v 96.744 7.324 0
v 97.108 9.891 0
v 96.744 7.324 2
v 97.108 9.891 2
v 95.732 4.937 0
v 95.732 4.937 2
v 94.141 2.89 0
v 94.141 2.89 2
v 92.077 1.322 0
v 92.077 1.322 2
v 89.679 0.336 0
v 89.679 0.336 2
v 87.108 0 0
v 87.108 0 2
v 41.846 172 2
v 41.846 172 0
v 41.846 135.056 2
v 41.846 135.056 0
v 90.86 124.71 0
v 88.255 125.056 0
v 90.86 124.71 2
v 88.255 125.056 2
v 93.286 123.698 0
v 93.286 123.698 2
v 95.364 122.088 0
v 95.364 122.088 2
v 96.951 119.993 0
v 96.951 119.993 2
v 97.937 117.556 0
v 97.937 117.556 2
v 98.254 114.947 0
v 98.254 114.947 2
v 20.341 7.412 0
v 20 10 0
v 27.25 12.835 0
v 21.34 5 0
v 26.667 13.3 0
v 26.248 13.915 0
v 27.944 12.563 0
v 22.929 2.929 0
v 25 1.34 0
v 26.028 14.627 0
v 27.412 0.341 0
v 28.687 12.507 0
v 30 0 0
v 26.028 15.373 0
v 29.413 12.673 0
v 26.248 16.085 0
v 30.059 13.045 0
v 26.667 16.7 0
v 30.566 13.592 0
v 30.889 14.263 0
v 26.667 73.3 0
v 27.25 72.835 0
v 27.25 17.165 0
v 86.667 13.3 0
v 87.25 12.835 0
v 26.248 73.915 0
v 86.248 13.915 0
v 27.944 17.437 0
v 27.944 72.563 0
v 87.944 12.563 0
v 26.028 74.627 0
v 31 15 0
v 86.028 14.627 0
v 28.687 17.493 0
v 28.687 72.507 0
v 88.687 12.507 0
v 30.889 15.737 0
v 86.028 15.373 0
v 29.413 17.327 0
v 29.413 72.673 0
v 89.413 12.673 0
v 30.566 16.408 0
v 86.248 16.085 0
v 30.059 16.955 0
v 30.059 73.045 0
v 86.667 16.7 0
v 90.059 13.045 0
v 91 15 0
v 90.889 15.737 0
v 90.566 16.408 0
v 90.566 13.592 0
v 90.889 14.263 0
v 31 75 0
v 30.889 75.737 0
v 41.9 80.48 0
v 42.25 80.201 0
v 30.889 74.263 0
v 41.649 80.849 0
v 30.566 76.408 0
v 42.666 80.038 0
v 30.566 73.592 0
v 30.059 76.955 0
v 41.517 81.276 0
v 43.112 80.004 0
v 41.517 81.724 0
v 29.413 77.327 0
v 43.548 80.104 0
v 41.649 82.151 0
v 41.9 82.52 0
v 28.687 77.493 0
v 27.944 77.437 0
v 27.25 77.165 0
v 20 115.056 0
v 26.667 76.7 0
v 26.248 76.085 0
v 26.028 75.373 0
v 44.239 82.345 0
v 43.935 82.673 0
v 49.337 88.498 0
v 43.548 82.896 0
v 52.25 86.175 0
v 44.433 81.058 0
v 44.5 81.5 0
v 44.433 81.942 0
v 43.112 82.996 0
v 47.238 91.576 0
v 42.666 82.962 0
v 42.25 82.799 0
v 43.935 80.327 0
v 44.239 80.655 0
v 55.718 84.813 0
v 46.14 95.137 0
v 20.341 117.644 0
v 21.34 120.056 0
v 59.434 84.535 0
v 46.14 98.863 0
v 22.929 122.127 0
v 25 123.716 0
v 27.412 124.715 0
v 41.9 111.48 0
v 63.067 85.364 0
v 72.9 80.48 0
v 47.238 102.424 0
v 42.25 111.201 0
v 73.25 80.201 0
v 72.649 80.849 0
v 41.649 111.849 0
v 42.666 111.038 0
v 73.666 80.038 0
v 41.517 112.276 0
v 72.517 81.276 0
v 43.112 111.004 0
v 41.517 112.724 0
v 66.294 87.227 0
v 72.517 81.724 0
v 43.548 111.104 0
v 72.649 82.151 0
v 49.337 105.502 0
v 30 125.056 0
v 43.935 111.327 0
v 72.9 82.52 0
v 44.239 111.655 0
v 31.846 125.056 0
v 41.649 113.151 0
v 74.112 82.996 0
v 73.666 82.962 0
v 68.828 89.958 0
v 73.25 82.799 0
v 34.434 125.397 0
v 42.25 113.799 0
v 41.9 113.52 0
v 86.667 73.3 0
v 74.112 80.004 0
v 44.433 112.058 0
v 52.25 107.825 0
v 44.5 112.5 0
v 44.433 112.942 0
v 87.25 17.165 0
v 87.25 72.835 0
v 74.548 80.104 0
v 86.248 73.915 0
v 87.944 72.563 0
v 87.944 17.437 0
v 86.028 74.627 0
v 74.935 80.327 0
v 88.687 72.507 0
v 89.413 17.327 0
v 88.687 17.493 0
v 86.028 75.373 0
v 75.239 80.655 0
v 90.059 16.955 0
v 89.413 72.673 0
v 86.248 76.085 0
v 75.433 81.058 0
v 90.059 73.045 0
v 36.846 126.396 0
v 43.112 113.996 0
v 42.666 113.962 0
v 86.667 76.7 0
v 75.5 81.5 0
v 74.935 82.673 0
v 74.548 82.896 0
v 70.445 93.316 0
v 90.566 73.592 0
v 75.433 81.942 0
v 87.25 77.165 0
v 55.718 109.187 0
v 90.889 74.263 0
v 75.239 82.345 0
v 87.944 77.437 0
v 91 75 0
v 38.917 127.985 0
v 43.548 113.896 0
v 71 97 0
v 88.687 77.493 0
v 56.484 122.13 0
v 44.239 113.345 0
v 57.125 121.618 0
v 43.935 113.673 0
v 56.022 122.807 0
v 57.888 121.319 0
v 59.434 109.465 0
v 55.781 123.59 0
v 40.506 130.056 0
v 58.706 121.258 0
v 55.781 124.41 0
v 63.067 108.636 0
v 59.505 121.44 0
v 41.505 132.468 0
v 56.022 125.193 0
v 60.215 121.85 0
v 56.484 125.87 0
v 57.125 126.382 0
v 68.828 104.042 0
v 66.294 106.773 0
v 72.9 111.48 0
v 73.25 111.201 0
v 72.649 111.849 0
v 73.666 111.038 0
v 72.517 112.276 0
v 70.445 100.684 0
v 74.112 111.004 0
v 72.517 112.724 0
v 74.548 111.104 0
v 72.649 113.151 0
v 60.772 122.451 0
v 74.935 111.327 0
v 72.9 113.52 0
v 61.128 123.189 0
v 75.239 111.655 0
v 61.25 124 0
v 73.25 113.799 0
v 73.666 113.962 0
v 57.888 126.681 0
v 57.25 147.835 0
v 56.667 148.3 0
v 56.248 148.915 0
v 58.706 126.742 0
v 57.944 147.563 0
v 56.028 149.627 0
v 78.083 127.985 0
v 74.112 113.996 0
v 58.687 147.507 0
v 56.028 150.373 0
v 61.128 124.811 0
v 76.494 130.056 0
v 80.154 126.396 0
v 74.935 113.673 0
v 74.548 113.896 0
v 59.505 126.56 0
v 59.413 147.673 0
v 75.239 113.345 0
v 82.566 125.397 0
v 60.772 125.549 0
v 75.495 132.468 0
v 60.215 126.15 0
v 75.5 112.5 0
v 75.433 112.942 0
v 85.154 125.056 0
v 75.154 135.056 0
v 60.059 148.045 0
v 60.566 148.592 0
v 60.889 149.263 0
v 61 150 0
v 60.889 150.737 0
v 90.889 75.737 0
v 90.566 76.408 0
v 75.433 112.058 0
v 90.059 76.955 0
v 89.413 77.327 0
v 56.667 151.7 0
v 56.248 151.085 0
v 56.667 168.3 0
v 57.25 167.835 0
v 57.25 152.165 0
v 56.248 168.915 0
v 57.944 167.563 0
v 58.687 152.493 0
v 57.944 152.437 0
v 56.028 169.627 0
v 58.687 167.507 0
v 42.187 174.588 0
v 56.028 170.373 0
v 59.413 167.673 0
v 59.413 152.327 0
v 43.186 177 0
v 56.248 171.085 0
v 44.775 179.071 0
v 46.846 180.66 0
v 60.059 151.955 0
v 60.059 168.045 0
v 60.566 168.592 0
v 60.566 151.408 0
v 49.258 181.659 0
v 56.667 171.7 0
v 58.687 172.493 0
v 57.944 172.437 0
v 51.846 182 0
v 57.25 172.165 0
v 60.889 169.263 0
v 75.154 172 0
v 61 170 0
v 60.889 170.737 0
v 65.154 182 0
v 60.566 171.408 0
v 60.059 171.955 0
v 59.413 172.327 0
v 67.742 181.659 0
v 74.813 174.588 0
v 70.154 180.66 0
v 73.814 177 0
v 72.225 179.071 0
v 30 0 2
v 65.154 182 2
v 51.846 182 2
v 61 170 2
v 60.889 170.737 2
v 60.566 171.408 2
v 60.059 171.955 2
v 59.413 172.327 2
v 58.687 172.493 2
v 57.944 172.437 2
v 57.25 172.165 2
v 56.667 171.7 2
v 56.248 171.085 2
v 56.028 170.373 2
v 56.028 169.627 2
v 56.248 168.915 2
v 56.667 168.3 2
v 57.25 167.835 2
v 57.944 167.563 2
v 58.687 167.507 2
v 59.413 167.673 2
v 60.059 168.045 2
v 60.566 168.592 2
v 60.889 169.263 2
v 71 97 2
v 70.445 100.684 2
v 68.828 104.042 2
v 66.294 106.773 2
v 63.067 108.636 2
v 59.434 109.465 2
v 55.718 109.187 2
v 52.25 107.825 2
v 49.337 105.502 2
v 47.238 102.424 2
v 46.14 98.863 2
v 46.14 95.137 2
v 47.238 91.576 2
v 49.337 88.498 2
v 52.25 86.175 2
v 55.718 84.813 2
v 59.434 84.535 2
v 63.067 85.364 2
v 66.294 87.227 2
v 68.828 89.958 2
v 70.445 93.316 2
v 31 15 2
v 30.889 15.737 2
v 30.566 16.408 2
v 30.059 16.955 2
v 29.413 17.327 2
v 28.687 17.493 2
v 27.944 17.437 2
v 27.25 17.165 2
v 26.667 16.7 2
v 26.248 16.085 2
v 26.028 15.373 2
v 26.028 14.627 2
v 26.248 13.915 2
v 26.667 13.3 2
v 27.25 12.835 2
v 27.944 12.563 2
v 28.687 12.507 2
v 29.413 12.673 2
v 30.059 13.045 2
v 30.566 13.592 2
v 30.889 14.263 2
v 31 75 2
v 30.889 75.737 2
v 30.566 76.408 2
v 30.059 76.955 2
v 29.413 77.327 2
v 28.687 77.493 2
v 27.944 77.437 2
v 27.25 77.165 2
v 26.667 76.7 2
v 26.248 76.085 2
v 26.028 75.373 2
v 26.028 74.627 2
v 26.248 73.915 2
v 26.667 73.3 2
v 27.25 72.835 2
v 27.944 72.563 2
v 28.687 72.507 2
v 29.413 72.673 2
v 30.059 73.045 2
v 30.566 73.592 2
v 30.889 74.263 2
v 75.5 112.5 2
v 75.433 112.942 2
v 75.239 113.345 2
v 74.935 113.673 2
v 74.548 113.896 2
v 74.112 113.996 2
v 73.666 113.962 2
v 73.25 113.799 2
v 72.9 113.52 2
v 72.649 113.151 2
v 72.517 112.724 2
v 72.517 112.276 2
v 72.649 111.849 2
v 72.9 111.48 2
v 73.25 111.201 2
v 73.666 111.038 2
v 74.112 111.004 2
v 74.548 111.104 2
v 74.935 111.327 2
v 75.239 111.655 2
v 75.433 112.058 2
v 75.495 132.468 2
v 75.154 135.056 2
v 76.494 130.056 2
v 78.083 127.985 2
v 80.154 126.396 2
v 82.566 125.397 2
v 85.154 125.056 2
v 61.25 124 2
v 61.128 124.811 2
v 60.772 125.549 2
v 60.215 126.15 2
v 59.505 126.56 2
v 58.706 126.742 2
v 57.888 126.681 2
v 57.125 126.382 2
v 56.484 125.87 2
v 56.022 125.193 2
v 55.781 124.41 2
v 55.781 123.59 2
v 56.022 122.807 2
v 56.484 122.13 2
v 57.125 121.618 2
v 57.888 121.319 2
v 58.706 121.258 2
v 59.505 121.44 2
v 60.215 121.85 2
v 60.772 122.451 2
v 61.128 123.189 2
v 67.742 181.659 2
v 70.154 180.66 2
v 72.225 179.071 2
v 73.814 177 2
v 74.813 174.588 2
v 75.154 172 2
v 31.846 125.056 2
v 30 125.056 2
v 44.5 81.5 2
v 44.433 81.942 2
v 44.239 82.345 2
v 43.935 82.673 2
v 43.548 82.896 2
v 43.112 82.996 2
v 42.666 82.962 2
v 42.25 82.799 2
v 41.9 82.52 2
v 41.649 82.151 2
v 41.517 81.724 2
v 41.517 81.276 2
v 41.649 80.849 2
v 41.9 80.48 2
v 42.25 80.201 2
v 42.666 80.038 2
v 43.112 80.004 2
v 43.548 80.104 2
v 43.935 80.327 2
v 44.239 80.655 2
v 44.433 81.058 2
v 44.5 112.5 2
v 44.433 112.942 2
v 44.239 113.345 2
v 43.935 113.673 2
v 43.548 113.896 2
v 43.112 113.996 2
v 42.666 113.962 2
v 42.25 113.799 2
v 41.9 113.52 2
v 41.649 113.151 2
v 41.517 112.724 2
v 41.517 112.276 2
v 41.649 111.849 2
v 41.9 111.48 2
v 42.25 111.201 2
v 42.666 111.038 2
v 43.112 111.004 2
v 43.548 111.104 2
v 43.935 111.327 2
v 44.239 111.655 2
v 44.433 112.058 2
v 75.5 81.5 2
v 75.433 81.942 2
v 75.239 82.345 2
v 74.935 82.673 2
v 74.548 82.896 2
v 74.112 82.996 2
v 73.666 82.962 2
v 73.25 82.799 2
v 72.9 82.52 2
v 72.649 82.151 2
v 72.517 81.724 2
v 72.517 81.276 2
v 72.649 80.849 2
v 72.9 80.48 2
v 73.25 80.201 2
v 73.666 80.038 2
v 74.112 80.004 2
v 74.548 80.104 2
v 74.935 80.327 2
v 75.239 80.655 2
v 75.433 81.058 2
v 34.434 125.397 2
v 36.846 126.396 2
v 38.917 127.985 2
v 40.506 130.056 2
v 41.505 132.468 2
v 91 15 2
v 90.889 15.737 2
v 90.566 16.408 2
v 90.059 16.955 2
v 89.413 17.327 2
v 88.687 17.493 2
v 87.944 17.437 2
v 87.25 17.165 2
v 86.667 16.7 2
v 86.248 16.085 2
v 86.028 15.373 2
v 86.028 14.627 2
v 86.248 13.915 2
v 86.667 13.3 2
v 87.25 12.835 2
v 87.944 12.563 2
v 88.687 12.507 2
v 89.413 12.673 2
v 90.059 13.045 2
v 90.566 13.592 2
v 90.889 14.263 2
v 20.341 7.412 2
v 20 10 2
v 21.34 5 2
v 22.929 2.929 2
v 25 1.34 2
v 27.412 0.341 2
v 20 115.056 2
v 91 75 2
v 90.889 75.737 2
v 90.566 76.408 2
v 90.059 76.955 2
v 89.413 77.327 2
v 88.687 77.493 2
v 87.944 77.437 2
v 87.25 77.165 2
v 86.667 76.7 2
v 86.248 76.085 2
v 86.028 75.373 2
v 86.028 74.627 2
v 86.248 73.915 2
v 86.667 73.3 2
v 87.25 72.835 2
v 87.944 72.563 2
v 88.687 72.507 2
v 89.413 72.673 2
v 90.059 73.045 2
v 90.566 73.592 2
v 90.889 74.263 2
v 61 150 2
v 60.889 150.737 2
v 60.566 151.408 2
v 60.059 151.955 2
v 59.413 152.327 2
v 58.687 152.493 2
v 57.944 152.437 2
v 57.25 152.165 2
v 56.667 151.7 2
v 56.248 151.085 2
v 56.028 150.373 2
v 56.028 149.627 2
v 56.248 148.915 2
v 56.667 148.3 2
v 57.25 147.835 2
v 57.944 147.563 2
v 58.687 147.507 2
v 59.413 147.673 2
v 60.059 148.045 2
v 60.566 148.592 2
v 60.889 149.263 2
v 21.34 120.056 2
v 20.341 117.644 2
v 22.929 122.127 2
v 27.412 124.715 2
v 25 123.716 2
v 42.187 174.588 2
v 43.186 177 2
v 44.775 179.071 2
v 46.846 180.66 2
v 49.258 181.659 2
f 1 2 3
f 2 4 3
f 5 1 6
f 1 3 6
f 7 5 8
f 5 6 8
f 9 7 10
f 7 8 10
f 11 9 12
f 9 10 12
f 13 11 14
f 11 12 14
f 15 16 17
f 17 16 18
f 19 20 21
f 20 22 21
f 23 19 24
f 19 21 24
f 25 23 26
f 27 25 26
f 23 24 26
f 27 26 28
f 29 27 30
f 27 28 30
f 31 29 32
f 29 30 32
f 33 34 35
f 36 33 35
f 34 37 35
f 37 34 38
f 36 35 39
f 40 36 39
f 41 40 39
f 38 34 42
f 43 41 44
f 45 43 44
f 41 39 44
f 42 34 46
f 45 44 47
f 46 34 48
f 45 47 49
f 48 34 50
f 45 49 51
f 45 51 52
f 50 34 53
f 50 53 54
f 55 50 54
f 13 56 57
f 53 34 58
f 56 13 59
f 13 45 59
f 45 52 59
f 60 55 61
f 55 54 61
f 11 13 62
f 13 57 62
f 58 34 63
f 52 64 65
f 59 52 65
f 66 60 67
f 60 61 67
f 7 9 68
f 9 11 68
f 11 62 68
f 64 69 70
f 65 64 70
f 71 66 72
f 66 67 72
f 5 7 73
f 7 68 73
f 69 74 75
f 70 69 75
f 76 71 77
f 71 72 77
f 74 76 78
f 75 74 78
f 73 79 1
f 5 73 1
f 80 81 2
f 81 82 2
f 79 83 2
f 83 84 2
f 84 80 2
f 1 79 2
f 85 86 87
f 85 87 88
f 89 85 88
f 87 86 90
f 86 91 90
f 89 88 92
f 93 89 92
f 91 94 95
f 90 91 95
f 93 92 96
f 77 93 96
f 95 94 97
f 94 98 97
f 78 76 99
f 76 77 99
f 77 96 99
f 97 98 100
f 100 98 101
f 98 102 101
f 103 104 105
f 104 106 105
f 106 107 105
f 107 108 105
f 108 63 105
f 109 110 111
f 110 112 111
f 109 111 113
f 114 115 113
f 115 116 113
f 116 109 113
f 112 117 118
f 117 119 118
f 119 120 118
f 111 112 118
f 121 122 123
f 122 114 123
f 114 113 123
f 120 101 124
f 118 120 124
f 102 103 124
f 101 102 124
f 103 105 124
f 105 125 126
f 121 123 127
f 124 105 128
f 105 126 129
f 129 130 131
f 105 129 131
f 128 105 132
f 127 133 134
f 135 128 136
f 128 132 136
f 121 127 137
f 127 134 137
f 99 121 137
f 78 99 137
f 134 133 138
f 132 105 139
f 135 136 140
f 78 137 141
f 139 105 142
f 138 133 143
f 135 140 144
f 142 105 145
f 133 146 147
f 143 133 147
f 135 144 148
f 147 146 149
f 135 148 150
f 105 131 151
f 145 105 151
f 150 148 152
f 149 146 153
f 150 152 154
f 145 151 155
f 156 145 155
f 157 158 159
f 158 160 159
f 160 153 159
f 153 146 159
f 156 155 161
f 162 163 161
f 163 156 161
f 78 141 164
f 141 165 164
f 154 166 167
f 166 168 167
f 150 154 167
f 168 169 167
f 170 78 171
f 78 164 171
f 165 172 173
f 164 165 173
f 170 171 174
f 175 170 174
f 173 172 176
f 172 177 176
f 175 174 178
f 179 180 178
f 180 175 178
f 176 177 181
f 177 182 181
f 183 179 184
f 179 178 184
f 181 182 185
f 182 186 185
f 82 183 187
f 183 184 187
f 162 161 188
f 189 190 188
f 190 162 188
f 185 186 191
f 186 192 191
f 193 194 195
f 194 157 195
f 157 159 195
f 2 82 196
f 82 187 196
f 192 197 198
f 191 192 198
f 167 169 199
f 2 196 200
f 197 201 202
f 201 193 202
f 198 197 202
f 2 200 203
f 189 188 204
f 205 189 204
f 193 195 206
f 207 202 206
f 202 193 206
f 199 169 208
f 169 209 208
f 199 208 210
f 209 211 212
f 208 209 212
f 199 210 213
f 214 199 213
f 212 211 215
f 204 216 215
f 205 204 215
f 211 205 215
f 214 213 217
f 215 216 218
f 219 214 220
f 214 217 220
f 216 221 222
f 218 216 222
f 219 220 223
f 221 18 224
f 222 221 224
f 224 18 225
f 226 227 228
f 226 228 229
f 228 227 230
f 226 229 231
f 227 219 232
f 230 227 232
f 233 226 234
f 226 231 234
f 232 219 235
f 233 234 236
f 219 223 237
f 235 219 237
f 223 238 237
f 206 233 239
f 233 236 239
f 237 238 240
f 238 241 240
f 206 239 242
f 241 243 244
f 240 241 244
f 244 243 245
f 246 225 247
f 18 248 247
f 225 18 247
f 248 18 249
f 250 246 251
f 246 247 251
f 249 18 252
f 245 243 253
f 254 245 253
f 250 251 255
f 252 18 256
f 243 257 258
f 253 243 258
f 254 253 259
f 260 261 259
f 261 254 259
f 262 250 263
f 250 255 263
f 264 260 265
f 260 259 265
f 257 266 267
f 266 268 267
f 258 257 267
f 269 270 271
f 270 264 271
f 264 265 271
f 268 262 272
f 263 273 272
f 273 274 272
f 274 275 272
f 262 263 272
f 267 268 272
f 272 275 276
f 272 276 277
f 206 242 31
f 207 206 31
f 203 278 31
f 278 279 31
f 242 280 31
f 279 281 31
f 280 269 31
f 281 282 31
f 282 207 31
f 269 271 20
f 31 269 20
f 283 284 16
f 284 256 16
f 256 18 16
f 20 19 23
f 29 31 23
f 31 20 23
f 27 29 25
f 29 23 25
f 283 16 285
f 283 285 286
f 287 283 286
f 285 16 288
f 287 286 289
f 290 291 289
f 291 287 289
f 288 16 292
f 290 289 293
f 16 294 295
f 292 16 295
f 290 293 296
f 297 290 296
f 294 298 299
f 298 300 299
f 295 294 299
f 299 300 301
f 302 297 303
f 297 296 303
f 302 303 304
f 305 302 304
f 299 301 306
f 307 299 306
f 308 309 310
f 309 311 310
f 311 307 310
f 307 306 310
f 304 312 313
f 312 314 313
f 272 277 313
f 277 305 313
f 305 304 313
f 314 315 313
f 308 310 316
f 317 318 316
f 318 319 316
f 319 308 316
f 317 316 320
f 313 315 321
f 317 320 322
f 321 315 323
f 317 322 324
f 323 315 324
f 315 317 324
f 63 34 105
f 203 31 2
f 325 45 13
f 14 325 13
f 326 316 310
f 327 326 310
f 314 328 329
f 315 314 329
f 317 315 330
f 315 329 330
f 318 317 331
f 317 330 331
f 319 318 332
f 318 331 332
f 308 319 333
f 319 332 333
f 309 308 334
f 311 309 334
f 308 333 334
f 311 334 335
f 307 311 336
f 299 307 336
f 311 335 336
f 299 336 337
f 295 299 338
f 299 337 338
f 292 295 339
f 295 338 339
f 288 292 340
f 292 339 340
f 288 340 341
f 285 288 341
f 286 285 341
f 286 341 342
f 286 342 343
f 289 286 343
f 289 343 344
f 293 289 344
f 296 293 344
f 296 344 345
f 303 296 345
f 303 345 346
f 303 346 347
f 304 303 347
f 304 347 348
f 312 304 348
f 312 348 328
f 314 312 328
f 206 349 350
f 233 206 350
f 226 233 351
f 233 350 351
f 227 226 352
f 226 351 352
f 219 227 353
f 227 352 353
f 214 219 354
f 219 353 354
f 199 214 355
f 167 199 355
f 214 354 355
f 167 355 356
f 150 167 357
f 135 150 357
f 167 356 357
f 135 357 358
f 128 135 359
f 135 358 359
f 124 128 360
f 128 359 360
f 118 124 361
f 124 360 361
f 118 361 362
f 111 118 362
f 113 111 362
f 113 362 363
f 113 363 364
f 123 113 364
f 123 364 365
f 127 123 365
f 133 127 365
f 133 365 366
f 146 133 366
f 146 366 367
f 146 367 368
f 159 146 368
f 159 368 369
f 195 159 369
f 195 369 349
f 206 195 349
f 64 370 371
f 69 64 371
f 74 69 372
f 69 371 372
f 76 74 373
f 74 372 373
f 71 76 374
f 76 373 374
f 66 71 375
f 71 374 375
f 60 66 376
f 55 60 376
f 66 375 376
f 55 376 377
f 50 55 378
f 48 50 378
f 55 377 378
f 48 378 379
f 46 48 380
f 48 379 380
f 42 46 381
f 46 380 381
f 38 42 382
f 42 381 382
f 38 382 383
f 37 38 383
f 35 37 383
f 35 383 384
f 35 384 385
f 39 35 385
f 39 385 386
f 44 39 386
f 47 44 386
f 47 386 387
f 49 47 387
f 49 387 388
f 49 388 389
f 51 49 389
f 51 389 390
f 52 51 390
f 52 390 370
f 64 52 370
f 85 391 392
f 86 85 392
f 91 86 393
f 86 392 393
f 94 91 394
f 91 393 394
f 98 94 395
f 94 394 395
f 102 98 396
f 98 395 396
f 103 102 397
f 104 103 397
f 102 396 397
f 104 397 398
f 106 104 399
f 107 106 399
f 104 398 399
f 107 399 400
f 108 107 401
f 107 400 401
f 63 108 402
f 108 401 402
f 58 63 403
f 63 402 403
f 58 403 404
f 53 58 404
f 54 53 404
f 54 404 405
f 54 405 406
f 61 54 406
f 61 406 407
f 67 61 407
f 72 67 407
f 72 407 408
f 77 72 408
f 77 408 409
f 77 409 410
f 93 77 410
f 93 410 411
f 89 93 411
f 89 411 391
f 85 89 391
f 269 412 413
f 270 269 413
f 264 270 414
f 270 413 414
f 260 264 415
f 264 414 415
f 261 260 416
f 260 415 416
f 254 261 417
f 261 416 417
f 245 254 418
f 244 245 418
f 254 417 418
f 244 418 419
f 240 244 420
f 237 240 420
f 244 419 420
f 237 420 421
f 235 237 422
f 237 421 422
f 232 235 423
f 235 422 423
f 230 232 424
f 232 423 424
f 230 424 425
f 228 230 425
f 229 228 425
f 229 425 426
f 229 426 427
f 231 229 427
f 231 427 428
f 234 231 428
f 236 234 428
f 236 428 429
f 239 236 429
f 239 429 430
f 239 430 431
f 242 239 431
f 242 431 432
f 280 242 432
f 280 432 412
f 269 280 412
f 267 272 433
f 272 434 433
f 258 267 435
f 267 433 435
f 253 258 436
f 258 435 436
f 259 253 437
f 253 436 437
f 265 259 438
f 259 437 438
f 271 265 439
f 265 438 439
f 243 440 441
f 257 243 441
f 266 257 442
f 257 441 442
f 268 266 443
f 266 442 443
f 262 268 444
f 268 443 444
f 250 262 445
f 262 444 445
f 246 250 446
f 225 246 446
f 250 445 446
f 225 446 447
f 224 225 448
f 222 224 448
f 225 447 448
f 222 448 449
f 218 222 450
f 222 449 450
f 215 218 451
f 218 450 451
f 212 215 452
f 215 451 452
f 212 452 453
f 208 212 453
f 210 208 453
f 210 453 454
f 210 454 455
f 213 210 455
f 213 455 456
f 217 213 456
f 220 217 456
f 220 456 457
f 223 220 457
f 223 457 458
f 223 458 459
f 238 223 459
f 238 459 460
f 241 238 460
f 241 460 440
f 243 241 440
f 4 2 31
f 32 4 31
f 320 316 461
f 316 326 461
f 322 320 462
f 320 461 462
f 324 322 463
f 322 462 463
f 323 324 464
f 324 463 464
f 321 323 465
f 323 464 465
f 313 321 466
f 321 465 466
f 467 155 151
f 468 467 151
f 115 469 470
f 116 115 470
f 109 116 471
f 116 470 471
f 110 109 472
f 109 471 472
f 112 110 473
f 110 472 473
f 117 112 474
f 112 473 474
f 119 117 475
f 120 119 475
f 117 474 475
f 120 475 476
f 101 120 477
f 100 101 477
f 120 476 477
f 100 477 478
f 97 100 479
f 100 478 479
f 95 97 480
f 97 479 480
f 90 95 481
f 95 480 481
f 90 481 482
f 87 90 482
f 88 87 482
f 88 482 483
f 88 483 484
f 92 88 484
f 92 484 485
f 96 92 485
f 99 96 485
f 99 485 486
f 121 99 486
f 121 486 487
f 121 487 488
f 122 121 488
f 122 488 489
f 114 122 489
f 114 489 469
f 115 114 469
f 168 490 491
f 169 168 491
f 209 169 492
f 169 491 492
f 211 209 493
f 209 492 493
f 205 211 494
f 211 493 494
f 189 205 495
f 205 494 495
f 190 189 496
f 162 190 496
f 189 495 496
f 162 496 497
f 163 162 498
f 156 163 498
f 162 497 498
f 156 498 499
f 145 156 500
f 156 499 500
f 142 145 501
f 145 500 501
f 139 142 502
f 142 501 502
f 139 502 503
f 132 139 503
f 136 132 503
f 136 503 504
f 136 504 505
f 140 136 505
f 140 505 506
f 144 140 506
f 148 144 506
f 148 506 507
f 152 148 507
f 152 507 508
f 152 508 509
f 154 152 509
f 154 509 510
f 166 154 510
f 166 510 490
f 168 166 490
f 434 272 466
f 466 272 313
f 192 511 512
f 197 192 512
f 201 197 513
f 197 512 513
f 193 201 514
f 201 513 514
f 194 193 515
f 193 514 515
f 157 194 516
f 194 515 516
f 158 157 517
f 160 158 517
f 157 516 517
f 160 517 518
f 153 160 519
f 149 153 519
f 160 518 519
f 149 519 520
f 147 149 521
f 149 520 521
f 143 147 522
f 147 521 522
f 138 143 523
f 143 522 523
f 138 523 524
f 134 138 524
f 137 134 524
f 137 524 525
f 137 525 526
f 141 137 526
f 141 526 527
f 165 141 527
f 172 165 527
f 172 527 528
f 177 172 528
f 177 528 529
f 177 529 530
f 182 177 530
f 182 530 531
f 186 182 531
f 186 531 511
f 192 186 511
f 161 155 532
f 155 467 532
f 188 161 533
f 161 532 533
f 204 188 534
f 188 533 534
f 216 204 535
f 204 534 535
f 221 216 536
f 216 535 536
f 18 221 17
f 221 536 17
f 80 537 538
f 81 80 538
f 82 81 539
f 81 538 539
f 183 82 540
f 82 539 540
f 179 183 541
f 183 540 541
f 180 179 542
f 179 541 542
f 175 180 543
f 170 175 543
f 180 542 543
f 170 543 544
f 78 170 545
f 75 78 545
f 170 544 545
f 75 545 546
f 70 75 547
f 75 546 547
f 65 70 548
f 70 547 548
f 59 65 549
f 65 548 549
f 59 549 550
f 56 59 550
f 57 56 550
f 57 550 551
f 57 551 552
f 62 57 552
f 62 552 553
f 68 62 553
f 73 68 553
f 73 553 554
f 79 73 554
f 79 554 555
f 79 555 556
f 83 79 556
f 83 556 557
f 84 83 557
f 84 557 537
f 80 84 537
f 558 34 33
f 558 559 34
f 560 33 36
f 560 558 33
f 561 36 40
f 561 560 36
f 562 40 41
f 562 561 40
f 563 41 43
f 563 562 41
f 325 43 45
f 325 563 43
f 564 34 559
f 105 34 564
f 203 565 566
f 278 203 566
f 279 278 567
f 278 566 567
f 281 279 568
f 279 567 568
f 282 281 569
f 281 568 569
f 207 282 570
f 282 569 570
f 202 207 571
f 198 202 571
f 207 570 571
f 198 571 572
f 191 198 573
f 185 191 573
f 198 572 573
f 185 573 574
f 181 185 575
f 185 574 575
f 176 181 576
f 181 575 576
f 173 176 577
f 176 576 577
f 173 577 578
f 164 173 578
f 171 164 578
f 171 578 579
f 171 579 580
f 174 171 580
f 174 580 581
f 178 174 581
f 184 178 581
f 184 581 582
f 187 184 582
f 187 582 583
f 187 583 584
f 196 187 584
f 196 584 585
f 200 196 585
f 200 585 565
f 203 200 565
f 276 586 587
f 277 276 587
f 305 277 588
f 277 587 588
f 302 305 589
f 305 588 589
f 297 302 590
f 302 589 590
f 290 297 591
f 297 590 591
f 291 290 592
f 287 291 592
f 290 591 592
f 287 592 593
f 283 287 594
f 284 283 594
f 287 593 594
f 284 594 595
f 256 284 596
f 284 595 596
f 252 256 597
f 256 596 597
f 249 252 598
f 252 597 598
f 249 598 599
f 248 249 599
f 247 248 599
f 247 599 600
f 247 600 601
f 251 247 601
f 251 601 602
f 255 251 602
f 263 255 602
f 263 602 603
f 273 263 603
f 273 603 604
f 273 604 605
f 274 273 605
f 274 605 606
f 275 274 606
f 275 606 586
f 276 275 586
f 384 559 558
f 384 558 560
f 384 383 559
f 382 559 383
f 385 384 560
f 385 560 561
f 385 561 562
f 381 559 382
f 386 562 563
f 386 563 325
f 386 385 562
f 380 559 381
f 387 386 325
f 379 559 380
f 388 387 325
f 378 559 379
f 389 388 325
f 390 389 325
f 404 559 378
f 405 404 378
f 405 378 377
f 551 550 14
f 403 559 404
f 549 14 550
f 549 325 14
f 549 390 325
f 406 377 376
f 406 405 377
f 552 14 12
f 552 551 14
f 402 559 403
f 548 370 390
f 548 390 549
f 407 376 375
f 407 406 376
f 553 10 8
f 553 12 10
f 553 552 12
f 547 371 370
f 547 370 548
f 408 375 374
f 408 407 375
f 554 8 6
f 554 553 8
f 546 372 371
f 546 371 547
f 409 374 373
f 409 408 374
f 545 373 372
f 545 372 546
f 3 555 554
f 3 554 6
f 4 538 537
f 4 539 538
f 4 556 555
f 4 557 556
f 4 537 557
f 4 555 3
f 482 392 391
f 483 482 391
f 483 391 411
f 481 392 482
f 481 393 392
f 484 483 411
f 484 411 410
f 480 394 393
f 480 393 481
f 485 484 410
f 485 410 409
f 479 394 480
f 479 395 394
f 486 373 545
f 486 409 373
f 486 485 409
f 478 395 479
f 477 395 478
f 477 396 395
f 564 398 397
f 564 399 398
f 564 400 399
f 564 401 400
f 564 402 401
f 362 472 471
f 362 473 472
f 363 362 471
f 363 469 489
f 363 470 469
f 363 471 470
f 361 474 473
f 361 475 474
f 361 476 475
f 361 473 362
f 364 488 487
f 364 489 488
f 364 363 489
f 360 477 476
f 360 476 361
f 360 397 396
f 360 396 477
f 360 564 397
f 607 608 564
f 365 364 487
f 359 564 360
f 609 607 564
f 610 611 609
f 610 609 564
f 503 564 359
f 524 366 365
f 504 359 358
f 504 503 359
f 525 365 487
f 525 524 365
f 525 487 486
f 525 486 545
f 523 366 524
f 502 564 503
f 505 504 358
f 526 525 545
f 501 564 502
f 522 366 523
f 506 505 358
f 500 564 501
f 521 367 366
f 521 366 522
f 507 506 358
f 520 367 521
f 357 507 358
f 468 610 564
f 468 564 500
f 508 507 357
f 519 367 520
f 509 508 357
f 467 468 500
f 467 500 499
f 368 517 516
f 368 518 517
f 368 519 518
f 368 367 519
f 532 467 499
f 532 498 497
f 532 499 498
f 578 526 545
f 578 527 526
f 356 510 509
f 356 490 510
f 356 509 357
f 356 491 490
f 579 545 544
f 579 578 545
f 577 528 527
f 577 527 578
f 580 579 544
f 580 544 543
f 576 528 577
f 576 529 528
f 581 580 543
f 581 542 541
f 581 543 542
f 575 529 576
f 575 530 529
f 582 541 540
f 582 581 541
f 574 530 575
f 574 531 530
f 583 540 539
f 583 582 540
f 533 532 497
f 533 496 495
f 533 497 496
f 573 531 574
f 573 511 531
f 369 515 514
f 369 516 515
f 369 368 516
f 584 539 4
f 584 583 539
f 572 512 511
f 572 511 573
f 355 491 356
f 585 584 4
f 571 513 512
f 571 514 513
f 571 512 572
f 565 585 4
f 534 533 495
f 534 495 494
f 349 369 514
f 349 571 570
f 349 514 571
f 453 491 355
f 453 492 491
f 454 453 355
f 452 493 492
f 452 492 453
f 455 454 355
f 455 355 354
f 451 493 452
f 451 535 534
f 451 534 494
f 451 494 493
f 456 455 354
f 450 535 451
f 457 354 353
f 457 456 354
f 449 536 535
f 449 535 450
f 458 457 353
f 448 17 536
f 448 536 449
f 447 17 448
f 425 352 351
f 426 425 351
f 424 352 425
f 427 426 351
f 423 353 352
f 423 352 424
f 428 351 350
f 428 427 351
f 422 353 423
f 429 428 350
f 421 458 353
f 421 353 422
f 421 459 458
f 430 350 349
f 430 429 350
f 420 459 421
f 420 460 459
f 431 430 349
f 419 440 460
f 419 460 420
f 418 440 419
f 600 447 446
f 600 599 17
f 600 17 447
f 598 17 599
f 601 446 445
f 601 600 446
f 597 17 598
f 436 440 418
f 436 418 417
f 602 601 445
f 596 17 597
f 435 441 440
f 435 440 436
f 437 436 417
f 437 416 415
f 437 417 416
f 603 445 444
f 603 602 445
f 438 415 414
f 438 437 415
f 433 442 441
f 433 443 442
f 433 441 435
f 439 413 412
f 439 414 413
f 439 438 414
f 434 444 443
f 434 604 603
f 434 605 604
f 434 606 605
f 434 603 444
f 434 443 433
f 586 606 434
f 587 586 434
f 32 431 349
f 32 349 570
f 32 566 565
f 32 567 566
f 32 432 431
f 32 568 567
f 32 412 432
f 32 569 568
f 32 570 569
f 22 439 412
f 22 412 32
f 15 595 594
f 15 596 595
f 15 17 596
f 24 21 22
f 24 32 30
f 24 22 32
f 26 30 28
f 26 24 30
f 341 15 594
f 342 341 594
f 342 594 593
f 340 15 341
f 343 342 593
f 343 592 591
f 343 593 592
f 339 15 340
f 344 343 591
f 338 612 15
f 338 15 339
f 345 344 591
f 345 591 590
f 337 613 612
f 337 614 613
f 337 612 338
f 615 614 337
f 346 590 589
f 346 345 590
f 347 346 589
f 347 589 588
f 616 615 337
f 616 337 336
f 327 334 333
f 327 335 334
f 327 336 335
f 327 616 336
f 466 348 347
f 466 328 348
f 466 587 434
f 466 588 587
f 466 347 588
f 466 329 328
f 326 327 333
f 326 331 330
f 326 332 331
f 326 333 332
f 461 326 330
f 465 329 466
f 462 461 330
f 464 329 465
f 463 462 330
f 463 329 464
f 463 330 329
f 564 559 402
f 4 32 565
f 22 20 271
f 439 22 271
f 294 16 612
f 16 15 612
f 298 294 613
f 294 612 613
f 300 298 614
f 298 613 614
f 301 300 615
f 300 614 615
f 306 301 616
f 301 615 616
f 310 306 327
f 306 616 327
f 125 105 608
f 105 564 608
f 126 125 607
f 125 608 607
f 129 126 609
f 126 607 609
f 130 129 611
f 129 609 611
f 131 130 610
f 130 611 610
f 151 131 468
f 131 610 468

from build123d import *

# Parameters (mm, degrees)
SKETCH1_W           = 117
SKETCH1_H           = 200
BOSS_EXTRUDE1_DEPTH = 2
CUT_EXTRUDE1_DEPTH  = 2
SKETCH3_R           = 2.5
SKETCH3_R_2         = 1.5
SKETCH3_R_3         = 12.5
SKETCH3_R_4         = 2.75
CUT_EXTRUDE2_DEPTH  = 30
FILLET1_R           = 20
CUT_EXTRUDE3_DEPTH  = 10
FILLET2_R           = 10
CUT_EXTRUDE4_DEPTH  = 10
FILLET3_R           = 10
CUT_EXTRUDE5_DEPTH  = 10
FILLET4_R           = 10


with BuildPart() as part:
    # Sketch1 → Boss-Extrude1 (new body)
    with BuildSketch(Plane.XY):
        with Locations((58.5, 100)):
            Rectangle(SKETCH1_W, SKETCH1_H)
    extrude(amount=BOSS_EXTRUDE1_DEPTH)

    # Sketch2 → Cut-Extrude1 (cut)
    with BuildSketch(Plane.XY.offset(2)):
        Polygon((0, 120), (40, 200), (0, 200), align=None)
        Polygon((77, 200), (117, 120), (117, 200), align=None)
    extrude(amount=-CUT_EXTRUDE1_DEPTH, mode=Mode.SUBTRACT)

    # Sketch3 → Cut-Extrude2 (cut)
    with BuildSketch(Plane.XY.offset(2)):
        with Locations((58.5, 170)):
            Circle(SKETCH3_R)
        with Locations((58.5, 150)):
            Circle(SKETCH3_R)
        with Locations((28.5, 15)):
            Circle(SKETCH3_R)
        with Locations((88.5, 15)):
            Circle(SKETCH3_R)
        with Locations((28.5, 75)):
            Circle(SKETCH3_R)
        with Locations((88.5, 75)):
            Circle(SKETCH3_R)
        with Locations((43, 112.5)):
            Circle(SKETCH3_R_2)
        with Locations((43, 81.5)):
            Circle(SKETCH3_R_2)
        with Locations((74, 81.5)):
            Circle(SKETCH3_R_2)
        with Locations((74, 112.5)):
            Circle(SKETCH3_R_2)
        with Locations((58.5, 97)):
            Circle(SKETCH3_R_3)
        with Locations((58.5, 124)):
            Circle(SKETCH3_R_4)
    extrude(amount=-CUT_EXTRUDE2_DEPTH, mode=Mode.SUBTRACT)

    # Fillet1
    fillet1_edges = [part.edges().sort_by_distance(p)[0] for p in [
        (0, 120, 1),
        (40, 200, 1),
        (117, 120, 1),
        (77, 200, 1),
        (117, 0, 1),
        (0, 0, 1),
    ]]
    fillet(fillet1_edges, radius=FILLET1_R)

    # Sketch4 → Cut-Extrude3 (cut)
    with BuildSketch(Plane(origin=(0, 0, 0), x_dir=(-1, 0, 0), z_dir=(0, 0, -1))):
        with BuildLine():
            Line((-97, 0), (-98.708203932, 156.583592135))
            Line((-98.708203932, 156.583592135), (-114.88854382, 124.22291236))
            ThreePointArc((-114.88854382, 124.22291236), (-116.464979789, 119.873698861), (-117, 115.27864045))
            Line((-117, 115.27864045), (-117, 20))
            ThreePointArc((-117, 20), (-111.142135624, 5.857864376), (-97, 0))
        make_face()
        with BuildLine():
            Line((-20, 0), (-20, 160))
            Line((-20, 160), (-18.291796068, 156.583592135))
            Line((-18.291796068, 156.583592135), (-2.11145618, 124.22291236))
            ThreePointArc((-2.11145618, 124.22291236), (-0.535020211, 119.873698861), (0, 115.27864045))
            Line((0, 115.27864045), (0, 20))
            ThreePointArc((0, 20), (-5.857864376, 5.857864376), (-20, 0))
        make_face()
    extrude(amount=-CUT_EXTRUDE3_DEPTH, mode=Mode.SUBTRACT)

    # Fillet2
    fillet2_edges = [part.edges().sort_by_distance(p)[0] for p in [
        (97, 0, 1),
        (20, 0, 1),
        (98.708203932, 156.583592135, 1),
        (20, 160, 1),
    ]]
    fillet(fillet2_edges, radius=FILLET2_R)

    # Sketch5 → Cut-Extrude4 (cut)
    with BuildSketch(Plane(origin=(0, 0, 0), x_dir=(-1, 0, 0), z_dir=(0, 0, -1))):
        with BuildLine():
            Line((-75.153942467, 125.055763262), (-75.153942467, 197.013016167))
            ThreePointArc((-75.153942467, 197.013016167), (-79.402826552, 193.49217851), (-82.527864045, 188.94427191))
            Line((-82.527864045, 188.94427191), (-97.626690246, 158.746619509))
            ThreePointArc((-97.626690246, 158.746619509), (-98.427295018, 156.518894044), (-98.681823334, 154.165397904))
            Line((-98.681823334, 154.165397904), (-98.364260097, 125.055763262))
            Line((-98.364260097, 125.055763262), (-75.153942467, 125.055763262))
        make_face()
        with BuildLine():
            ThreePointArc((-34.472135955, 188.94427191), (-37.597173448, 193.49217851), (-41.846057533, 197.013016167))
            Line((-41.846057533, 197.013016167), (-41.846057533, 125.055763262))
            Line((-41.846057533, 125.055763262), (-20, 125.055763262))
            Line((-20, 125.055763262), (-20, 157.639320225))
            ThreePointArc((-20, 157.639320225), (-20.267510105, 159.93684943), (-21.05572809, 162.11145618))
            Line((-21.05572809, 162.11145618), (-34.472135955, 188.94427191))
        make_face()
    extrude(amount=-CUT_EXTRUDE4_DEPTH, mode=Mode.SUBTRACT)

    # Fillet3
    fillet3_edges = [part.edges().sort_by_distance(p)[0] for p in [
        (75.153942467, 197.013016167, 1),
        (41.846057533, 197.013016167, 1),
        (75.153942467, 125.055763262, 1),
        (98.364260097, 125.055763262, 1),
        (41.846057533, 125.055763262, 1),
        (20, 125.055763262, 1),
    ]]
    fillet(fillet3_edges, radius=FILLET3_R)

    # Sketch6 → Cut-Extrude5 (cut)
    with BuildSketch(Plane(origin=(0, 0, 0), x_dir=(-1, 0, 0), z_dir=(0, 0, -1))):
        with BuildLine():
            Line((-75.153942467, 189.986749418), (-75.153942467, 182))
            Line((-75.153942467, 182), (-41.846057533, 182))
            Line((-41.846057533, 182), (-41.846057533, 189.986749418))
            ThreePointArc((-41.846057533, 189.986749418), (-44.595325762, 196.873467707), (-51.33143529, 199.973498837))
            ThreePointArc((-51.33143529, 199.973498837), (-51.845886972, 199.993373612), (-52.360679775, 200))
            Line((-52.360679775, 200), (-64.639320225, 200))
            ThreePointArc((-64.639320225, 200), (-65.154113028, 199.993373612), (-65.66856471, 199.973498837))
            ThreePointArc((-65.66856471, 199.973498837), (-72.404674238, 196.873467707), (-75.153942467, 189.986749418))
        make_face()
    extrude(amount=-CUT_EXTRUDE5_DEPTH, mode=Mode.SUBTRACT)

    # Fillet4
    fillet4_edges = [part.edges().sort_by_distance(p)[0] for p in [
        (41.846057533, 182, 1),
        (75.153942467, 182, 1),
    ]]
    fillet(fillet4_edges, radius=FILLET4_R)


solid = part.part
